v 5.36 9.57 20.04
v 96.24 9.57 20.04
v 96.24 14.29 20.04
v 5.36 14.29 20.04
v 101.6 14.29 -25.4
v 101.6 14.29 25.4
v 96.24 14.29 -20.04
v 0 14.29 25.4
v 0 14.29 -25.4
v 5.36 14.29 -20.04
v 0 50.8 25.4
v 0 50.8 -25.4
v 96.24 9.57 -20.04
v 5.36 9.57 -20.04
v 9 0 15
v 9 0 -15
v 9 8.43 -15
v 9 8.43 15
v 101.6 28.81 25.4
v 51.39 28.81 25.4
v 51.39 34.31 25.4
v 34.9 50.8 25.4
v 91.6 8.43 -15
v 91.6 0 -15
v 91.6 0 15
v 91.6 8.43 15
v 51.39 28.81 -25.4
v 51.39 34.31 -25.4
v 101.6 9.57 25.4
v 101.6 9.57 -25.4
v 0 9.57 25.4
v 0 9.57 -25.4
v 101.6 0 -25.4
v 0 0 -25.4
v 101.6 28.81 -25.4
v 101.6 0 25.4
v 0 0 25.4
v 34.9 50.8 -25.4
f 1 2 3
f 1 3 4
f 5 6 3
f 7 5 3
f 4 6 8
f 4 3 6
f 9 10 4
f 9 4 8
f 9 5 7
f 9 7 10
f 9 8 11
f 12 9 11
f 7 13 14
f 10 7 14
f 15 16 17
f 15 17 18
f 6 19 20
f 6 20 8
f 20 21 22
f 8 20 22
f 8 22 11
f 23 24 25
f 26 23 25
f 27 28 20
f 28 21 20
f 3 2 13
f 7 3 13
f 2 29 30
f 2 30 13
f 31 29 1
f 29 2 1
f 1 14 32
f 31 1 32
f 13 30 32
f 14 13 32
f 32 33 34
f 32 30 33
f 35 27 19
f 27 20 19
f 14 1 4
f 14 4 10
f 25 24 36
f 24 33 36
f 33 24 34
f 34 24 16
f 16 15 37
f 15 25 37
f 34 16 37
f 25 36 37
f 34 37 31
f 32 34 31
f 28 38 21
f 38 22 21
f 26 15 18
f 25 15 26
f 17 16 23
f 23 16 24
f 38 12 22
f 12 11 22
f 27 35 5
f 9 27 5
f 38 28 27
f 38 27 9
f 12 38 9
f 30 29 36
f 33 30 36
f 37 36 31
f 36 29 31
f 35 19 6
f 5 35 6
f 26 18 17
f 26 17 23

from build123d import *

# Parameters (mm, degrees)
BOSS_EXTRUDE1_DEPTH = 25.4
SKETCH2_W           = 101.6
SKETCH2_H           = 50.8
SKETCH2_W_2         = 90.88
SKETCH2_H_2         = 40.08
CUT_EXTRUDE1_DEPTH  = 4.72
SKETCH3_W           = 82.6
SKETCH3_H           = 30
CUT_EXTRUDE2_DEPTH  = 8.43


with BuildPart() as part:
    # Sketch1 → Boss-Extrude1 (new, symmetric)
    with BuildSketch(Plane.XY):
        Polygon((0, 0), (0, 50.8), (34.9, 50.8), (51.39, 34.31), (51.39, 28.81), (101.6, 28.81), (101.6, 0), align=None)
    extrude(amount=BOSS_EXTRUDE1_DEPTH, both=True)

    # Sketch2 → Cut-Extrude1 (cut)
    with BuildSketch(Plane(origin=(0, 9.57, 0), x_dir=(-1, 0, 0), z_dir=(0, -1, 0))):
        with Locations((-50.8, 0)):
            Rectangle(SKETCH2_W, SKETCH2_H)
        with Locations((-50.8, 0)):
            Rectangle(SKETCH2_W_2, SKETCH2_H_2, mode=Mode.SUBTRACT)
    extrude(amount=-CUT_EXTRUDE1_DEPTH, mode=Mode.SUBTRACT)

    # Sketch3 → Cut-Extrude2 (cut)
    with BuildSketch(Plane.XZ):
        with Locations((50.3, 0)):
            Rectangle(SKETCH3_W, SKETCH3_H)
    extrude(amount=-CUT_EXTRUDE2_DEPTH, mode=Mode.SUBTRACT)


solid = part.part
